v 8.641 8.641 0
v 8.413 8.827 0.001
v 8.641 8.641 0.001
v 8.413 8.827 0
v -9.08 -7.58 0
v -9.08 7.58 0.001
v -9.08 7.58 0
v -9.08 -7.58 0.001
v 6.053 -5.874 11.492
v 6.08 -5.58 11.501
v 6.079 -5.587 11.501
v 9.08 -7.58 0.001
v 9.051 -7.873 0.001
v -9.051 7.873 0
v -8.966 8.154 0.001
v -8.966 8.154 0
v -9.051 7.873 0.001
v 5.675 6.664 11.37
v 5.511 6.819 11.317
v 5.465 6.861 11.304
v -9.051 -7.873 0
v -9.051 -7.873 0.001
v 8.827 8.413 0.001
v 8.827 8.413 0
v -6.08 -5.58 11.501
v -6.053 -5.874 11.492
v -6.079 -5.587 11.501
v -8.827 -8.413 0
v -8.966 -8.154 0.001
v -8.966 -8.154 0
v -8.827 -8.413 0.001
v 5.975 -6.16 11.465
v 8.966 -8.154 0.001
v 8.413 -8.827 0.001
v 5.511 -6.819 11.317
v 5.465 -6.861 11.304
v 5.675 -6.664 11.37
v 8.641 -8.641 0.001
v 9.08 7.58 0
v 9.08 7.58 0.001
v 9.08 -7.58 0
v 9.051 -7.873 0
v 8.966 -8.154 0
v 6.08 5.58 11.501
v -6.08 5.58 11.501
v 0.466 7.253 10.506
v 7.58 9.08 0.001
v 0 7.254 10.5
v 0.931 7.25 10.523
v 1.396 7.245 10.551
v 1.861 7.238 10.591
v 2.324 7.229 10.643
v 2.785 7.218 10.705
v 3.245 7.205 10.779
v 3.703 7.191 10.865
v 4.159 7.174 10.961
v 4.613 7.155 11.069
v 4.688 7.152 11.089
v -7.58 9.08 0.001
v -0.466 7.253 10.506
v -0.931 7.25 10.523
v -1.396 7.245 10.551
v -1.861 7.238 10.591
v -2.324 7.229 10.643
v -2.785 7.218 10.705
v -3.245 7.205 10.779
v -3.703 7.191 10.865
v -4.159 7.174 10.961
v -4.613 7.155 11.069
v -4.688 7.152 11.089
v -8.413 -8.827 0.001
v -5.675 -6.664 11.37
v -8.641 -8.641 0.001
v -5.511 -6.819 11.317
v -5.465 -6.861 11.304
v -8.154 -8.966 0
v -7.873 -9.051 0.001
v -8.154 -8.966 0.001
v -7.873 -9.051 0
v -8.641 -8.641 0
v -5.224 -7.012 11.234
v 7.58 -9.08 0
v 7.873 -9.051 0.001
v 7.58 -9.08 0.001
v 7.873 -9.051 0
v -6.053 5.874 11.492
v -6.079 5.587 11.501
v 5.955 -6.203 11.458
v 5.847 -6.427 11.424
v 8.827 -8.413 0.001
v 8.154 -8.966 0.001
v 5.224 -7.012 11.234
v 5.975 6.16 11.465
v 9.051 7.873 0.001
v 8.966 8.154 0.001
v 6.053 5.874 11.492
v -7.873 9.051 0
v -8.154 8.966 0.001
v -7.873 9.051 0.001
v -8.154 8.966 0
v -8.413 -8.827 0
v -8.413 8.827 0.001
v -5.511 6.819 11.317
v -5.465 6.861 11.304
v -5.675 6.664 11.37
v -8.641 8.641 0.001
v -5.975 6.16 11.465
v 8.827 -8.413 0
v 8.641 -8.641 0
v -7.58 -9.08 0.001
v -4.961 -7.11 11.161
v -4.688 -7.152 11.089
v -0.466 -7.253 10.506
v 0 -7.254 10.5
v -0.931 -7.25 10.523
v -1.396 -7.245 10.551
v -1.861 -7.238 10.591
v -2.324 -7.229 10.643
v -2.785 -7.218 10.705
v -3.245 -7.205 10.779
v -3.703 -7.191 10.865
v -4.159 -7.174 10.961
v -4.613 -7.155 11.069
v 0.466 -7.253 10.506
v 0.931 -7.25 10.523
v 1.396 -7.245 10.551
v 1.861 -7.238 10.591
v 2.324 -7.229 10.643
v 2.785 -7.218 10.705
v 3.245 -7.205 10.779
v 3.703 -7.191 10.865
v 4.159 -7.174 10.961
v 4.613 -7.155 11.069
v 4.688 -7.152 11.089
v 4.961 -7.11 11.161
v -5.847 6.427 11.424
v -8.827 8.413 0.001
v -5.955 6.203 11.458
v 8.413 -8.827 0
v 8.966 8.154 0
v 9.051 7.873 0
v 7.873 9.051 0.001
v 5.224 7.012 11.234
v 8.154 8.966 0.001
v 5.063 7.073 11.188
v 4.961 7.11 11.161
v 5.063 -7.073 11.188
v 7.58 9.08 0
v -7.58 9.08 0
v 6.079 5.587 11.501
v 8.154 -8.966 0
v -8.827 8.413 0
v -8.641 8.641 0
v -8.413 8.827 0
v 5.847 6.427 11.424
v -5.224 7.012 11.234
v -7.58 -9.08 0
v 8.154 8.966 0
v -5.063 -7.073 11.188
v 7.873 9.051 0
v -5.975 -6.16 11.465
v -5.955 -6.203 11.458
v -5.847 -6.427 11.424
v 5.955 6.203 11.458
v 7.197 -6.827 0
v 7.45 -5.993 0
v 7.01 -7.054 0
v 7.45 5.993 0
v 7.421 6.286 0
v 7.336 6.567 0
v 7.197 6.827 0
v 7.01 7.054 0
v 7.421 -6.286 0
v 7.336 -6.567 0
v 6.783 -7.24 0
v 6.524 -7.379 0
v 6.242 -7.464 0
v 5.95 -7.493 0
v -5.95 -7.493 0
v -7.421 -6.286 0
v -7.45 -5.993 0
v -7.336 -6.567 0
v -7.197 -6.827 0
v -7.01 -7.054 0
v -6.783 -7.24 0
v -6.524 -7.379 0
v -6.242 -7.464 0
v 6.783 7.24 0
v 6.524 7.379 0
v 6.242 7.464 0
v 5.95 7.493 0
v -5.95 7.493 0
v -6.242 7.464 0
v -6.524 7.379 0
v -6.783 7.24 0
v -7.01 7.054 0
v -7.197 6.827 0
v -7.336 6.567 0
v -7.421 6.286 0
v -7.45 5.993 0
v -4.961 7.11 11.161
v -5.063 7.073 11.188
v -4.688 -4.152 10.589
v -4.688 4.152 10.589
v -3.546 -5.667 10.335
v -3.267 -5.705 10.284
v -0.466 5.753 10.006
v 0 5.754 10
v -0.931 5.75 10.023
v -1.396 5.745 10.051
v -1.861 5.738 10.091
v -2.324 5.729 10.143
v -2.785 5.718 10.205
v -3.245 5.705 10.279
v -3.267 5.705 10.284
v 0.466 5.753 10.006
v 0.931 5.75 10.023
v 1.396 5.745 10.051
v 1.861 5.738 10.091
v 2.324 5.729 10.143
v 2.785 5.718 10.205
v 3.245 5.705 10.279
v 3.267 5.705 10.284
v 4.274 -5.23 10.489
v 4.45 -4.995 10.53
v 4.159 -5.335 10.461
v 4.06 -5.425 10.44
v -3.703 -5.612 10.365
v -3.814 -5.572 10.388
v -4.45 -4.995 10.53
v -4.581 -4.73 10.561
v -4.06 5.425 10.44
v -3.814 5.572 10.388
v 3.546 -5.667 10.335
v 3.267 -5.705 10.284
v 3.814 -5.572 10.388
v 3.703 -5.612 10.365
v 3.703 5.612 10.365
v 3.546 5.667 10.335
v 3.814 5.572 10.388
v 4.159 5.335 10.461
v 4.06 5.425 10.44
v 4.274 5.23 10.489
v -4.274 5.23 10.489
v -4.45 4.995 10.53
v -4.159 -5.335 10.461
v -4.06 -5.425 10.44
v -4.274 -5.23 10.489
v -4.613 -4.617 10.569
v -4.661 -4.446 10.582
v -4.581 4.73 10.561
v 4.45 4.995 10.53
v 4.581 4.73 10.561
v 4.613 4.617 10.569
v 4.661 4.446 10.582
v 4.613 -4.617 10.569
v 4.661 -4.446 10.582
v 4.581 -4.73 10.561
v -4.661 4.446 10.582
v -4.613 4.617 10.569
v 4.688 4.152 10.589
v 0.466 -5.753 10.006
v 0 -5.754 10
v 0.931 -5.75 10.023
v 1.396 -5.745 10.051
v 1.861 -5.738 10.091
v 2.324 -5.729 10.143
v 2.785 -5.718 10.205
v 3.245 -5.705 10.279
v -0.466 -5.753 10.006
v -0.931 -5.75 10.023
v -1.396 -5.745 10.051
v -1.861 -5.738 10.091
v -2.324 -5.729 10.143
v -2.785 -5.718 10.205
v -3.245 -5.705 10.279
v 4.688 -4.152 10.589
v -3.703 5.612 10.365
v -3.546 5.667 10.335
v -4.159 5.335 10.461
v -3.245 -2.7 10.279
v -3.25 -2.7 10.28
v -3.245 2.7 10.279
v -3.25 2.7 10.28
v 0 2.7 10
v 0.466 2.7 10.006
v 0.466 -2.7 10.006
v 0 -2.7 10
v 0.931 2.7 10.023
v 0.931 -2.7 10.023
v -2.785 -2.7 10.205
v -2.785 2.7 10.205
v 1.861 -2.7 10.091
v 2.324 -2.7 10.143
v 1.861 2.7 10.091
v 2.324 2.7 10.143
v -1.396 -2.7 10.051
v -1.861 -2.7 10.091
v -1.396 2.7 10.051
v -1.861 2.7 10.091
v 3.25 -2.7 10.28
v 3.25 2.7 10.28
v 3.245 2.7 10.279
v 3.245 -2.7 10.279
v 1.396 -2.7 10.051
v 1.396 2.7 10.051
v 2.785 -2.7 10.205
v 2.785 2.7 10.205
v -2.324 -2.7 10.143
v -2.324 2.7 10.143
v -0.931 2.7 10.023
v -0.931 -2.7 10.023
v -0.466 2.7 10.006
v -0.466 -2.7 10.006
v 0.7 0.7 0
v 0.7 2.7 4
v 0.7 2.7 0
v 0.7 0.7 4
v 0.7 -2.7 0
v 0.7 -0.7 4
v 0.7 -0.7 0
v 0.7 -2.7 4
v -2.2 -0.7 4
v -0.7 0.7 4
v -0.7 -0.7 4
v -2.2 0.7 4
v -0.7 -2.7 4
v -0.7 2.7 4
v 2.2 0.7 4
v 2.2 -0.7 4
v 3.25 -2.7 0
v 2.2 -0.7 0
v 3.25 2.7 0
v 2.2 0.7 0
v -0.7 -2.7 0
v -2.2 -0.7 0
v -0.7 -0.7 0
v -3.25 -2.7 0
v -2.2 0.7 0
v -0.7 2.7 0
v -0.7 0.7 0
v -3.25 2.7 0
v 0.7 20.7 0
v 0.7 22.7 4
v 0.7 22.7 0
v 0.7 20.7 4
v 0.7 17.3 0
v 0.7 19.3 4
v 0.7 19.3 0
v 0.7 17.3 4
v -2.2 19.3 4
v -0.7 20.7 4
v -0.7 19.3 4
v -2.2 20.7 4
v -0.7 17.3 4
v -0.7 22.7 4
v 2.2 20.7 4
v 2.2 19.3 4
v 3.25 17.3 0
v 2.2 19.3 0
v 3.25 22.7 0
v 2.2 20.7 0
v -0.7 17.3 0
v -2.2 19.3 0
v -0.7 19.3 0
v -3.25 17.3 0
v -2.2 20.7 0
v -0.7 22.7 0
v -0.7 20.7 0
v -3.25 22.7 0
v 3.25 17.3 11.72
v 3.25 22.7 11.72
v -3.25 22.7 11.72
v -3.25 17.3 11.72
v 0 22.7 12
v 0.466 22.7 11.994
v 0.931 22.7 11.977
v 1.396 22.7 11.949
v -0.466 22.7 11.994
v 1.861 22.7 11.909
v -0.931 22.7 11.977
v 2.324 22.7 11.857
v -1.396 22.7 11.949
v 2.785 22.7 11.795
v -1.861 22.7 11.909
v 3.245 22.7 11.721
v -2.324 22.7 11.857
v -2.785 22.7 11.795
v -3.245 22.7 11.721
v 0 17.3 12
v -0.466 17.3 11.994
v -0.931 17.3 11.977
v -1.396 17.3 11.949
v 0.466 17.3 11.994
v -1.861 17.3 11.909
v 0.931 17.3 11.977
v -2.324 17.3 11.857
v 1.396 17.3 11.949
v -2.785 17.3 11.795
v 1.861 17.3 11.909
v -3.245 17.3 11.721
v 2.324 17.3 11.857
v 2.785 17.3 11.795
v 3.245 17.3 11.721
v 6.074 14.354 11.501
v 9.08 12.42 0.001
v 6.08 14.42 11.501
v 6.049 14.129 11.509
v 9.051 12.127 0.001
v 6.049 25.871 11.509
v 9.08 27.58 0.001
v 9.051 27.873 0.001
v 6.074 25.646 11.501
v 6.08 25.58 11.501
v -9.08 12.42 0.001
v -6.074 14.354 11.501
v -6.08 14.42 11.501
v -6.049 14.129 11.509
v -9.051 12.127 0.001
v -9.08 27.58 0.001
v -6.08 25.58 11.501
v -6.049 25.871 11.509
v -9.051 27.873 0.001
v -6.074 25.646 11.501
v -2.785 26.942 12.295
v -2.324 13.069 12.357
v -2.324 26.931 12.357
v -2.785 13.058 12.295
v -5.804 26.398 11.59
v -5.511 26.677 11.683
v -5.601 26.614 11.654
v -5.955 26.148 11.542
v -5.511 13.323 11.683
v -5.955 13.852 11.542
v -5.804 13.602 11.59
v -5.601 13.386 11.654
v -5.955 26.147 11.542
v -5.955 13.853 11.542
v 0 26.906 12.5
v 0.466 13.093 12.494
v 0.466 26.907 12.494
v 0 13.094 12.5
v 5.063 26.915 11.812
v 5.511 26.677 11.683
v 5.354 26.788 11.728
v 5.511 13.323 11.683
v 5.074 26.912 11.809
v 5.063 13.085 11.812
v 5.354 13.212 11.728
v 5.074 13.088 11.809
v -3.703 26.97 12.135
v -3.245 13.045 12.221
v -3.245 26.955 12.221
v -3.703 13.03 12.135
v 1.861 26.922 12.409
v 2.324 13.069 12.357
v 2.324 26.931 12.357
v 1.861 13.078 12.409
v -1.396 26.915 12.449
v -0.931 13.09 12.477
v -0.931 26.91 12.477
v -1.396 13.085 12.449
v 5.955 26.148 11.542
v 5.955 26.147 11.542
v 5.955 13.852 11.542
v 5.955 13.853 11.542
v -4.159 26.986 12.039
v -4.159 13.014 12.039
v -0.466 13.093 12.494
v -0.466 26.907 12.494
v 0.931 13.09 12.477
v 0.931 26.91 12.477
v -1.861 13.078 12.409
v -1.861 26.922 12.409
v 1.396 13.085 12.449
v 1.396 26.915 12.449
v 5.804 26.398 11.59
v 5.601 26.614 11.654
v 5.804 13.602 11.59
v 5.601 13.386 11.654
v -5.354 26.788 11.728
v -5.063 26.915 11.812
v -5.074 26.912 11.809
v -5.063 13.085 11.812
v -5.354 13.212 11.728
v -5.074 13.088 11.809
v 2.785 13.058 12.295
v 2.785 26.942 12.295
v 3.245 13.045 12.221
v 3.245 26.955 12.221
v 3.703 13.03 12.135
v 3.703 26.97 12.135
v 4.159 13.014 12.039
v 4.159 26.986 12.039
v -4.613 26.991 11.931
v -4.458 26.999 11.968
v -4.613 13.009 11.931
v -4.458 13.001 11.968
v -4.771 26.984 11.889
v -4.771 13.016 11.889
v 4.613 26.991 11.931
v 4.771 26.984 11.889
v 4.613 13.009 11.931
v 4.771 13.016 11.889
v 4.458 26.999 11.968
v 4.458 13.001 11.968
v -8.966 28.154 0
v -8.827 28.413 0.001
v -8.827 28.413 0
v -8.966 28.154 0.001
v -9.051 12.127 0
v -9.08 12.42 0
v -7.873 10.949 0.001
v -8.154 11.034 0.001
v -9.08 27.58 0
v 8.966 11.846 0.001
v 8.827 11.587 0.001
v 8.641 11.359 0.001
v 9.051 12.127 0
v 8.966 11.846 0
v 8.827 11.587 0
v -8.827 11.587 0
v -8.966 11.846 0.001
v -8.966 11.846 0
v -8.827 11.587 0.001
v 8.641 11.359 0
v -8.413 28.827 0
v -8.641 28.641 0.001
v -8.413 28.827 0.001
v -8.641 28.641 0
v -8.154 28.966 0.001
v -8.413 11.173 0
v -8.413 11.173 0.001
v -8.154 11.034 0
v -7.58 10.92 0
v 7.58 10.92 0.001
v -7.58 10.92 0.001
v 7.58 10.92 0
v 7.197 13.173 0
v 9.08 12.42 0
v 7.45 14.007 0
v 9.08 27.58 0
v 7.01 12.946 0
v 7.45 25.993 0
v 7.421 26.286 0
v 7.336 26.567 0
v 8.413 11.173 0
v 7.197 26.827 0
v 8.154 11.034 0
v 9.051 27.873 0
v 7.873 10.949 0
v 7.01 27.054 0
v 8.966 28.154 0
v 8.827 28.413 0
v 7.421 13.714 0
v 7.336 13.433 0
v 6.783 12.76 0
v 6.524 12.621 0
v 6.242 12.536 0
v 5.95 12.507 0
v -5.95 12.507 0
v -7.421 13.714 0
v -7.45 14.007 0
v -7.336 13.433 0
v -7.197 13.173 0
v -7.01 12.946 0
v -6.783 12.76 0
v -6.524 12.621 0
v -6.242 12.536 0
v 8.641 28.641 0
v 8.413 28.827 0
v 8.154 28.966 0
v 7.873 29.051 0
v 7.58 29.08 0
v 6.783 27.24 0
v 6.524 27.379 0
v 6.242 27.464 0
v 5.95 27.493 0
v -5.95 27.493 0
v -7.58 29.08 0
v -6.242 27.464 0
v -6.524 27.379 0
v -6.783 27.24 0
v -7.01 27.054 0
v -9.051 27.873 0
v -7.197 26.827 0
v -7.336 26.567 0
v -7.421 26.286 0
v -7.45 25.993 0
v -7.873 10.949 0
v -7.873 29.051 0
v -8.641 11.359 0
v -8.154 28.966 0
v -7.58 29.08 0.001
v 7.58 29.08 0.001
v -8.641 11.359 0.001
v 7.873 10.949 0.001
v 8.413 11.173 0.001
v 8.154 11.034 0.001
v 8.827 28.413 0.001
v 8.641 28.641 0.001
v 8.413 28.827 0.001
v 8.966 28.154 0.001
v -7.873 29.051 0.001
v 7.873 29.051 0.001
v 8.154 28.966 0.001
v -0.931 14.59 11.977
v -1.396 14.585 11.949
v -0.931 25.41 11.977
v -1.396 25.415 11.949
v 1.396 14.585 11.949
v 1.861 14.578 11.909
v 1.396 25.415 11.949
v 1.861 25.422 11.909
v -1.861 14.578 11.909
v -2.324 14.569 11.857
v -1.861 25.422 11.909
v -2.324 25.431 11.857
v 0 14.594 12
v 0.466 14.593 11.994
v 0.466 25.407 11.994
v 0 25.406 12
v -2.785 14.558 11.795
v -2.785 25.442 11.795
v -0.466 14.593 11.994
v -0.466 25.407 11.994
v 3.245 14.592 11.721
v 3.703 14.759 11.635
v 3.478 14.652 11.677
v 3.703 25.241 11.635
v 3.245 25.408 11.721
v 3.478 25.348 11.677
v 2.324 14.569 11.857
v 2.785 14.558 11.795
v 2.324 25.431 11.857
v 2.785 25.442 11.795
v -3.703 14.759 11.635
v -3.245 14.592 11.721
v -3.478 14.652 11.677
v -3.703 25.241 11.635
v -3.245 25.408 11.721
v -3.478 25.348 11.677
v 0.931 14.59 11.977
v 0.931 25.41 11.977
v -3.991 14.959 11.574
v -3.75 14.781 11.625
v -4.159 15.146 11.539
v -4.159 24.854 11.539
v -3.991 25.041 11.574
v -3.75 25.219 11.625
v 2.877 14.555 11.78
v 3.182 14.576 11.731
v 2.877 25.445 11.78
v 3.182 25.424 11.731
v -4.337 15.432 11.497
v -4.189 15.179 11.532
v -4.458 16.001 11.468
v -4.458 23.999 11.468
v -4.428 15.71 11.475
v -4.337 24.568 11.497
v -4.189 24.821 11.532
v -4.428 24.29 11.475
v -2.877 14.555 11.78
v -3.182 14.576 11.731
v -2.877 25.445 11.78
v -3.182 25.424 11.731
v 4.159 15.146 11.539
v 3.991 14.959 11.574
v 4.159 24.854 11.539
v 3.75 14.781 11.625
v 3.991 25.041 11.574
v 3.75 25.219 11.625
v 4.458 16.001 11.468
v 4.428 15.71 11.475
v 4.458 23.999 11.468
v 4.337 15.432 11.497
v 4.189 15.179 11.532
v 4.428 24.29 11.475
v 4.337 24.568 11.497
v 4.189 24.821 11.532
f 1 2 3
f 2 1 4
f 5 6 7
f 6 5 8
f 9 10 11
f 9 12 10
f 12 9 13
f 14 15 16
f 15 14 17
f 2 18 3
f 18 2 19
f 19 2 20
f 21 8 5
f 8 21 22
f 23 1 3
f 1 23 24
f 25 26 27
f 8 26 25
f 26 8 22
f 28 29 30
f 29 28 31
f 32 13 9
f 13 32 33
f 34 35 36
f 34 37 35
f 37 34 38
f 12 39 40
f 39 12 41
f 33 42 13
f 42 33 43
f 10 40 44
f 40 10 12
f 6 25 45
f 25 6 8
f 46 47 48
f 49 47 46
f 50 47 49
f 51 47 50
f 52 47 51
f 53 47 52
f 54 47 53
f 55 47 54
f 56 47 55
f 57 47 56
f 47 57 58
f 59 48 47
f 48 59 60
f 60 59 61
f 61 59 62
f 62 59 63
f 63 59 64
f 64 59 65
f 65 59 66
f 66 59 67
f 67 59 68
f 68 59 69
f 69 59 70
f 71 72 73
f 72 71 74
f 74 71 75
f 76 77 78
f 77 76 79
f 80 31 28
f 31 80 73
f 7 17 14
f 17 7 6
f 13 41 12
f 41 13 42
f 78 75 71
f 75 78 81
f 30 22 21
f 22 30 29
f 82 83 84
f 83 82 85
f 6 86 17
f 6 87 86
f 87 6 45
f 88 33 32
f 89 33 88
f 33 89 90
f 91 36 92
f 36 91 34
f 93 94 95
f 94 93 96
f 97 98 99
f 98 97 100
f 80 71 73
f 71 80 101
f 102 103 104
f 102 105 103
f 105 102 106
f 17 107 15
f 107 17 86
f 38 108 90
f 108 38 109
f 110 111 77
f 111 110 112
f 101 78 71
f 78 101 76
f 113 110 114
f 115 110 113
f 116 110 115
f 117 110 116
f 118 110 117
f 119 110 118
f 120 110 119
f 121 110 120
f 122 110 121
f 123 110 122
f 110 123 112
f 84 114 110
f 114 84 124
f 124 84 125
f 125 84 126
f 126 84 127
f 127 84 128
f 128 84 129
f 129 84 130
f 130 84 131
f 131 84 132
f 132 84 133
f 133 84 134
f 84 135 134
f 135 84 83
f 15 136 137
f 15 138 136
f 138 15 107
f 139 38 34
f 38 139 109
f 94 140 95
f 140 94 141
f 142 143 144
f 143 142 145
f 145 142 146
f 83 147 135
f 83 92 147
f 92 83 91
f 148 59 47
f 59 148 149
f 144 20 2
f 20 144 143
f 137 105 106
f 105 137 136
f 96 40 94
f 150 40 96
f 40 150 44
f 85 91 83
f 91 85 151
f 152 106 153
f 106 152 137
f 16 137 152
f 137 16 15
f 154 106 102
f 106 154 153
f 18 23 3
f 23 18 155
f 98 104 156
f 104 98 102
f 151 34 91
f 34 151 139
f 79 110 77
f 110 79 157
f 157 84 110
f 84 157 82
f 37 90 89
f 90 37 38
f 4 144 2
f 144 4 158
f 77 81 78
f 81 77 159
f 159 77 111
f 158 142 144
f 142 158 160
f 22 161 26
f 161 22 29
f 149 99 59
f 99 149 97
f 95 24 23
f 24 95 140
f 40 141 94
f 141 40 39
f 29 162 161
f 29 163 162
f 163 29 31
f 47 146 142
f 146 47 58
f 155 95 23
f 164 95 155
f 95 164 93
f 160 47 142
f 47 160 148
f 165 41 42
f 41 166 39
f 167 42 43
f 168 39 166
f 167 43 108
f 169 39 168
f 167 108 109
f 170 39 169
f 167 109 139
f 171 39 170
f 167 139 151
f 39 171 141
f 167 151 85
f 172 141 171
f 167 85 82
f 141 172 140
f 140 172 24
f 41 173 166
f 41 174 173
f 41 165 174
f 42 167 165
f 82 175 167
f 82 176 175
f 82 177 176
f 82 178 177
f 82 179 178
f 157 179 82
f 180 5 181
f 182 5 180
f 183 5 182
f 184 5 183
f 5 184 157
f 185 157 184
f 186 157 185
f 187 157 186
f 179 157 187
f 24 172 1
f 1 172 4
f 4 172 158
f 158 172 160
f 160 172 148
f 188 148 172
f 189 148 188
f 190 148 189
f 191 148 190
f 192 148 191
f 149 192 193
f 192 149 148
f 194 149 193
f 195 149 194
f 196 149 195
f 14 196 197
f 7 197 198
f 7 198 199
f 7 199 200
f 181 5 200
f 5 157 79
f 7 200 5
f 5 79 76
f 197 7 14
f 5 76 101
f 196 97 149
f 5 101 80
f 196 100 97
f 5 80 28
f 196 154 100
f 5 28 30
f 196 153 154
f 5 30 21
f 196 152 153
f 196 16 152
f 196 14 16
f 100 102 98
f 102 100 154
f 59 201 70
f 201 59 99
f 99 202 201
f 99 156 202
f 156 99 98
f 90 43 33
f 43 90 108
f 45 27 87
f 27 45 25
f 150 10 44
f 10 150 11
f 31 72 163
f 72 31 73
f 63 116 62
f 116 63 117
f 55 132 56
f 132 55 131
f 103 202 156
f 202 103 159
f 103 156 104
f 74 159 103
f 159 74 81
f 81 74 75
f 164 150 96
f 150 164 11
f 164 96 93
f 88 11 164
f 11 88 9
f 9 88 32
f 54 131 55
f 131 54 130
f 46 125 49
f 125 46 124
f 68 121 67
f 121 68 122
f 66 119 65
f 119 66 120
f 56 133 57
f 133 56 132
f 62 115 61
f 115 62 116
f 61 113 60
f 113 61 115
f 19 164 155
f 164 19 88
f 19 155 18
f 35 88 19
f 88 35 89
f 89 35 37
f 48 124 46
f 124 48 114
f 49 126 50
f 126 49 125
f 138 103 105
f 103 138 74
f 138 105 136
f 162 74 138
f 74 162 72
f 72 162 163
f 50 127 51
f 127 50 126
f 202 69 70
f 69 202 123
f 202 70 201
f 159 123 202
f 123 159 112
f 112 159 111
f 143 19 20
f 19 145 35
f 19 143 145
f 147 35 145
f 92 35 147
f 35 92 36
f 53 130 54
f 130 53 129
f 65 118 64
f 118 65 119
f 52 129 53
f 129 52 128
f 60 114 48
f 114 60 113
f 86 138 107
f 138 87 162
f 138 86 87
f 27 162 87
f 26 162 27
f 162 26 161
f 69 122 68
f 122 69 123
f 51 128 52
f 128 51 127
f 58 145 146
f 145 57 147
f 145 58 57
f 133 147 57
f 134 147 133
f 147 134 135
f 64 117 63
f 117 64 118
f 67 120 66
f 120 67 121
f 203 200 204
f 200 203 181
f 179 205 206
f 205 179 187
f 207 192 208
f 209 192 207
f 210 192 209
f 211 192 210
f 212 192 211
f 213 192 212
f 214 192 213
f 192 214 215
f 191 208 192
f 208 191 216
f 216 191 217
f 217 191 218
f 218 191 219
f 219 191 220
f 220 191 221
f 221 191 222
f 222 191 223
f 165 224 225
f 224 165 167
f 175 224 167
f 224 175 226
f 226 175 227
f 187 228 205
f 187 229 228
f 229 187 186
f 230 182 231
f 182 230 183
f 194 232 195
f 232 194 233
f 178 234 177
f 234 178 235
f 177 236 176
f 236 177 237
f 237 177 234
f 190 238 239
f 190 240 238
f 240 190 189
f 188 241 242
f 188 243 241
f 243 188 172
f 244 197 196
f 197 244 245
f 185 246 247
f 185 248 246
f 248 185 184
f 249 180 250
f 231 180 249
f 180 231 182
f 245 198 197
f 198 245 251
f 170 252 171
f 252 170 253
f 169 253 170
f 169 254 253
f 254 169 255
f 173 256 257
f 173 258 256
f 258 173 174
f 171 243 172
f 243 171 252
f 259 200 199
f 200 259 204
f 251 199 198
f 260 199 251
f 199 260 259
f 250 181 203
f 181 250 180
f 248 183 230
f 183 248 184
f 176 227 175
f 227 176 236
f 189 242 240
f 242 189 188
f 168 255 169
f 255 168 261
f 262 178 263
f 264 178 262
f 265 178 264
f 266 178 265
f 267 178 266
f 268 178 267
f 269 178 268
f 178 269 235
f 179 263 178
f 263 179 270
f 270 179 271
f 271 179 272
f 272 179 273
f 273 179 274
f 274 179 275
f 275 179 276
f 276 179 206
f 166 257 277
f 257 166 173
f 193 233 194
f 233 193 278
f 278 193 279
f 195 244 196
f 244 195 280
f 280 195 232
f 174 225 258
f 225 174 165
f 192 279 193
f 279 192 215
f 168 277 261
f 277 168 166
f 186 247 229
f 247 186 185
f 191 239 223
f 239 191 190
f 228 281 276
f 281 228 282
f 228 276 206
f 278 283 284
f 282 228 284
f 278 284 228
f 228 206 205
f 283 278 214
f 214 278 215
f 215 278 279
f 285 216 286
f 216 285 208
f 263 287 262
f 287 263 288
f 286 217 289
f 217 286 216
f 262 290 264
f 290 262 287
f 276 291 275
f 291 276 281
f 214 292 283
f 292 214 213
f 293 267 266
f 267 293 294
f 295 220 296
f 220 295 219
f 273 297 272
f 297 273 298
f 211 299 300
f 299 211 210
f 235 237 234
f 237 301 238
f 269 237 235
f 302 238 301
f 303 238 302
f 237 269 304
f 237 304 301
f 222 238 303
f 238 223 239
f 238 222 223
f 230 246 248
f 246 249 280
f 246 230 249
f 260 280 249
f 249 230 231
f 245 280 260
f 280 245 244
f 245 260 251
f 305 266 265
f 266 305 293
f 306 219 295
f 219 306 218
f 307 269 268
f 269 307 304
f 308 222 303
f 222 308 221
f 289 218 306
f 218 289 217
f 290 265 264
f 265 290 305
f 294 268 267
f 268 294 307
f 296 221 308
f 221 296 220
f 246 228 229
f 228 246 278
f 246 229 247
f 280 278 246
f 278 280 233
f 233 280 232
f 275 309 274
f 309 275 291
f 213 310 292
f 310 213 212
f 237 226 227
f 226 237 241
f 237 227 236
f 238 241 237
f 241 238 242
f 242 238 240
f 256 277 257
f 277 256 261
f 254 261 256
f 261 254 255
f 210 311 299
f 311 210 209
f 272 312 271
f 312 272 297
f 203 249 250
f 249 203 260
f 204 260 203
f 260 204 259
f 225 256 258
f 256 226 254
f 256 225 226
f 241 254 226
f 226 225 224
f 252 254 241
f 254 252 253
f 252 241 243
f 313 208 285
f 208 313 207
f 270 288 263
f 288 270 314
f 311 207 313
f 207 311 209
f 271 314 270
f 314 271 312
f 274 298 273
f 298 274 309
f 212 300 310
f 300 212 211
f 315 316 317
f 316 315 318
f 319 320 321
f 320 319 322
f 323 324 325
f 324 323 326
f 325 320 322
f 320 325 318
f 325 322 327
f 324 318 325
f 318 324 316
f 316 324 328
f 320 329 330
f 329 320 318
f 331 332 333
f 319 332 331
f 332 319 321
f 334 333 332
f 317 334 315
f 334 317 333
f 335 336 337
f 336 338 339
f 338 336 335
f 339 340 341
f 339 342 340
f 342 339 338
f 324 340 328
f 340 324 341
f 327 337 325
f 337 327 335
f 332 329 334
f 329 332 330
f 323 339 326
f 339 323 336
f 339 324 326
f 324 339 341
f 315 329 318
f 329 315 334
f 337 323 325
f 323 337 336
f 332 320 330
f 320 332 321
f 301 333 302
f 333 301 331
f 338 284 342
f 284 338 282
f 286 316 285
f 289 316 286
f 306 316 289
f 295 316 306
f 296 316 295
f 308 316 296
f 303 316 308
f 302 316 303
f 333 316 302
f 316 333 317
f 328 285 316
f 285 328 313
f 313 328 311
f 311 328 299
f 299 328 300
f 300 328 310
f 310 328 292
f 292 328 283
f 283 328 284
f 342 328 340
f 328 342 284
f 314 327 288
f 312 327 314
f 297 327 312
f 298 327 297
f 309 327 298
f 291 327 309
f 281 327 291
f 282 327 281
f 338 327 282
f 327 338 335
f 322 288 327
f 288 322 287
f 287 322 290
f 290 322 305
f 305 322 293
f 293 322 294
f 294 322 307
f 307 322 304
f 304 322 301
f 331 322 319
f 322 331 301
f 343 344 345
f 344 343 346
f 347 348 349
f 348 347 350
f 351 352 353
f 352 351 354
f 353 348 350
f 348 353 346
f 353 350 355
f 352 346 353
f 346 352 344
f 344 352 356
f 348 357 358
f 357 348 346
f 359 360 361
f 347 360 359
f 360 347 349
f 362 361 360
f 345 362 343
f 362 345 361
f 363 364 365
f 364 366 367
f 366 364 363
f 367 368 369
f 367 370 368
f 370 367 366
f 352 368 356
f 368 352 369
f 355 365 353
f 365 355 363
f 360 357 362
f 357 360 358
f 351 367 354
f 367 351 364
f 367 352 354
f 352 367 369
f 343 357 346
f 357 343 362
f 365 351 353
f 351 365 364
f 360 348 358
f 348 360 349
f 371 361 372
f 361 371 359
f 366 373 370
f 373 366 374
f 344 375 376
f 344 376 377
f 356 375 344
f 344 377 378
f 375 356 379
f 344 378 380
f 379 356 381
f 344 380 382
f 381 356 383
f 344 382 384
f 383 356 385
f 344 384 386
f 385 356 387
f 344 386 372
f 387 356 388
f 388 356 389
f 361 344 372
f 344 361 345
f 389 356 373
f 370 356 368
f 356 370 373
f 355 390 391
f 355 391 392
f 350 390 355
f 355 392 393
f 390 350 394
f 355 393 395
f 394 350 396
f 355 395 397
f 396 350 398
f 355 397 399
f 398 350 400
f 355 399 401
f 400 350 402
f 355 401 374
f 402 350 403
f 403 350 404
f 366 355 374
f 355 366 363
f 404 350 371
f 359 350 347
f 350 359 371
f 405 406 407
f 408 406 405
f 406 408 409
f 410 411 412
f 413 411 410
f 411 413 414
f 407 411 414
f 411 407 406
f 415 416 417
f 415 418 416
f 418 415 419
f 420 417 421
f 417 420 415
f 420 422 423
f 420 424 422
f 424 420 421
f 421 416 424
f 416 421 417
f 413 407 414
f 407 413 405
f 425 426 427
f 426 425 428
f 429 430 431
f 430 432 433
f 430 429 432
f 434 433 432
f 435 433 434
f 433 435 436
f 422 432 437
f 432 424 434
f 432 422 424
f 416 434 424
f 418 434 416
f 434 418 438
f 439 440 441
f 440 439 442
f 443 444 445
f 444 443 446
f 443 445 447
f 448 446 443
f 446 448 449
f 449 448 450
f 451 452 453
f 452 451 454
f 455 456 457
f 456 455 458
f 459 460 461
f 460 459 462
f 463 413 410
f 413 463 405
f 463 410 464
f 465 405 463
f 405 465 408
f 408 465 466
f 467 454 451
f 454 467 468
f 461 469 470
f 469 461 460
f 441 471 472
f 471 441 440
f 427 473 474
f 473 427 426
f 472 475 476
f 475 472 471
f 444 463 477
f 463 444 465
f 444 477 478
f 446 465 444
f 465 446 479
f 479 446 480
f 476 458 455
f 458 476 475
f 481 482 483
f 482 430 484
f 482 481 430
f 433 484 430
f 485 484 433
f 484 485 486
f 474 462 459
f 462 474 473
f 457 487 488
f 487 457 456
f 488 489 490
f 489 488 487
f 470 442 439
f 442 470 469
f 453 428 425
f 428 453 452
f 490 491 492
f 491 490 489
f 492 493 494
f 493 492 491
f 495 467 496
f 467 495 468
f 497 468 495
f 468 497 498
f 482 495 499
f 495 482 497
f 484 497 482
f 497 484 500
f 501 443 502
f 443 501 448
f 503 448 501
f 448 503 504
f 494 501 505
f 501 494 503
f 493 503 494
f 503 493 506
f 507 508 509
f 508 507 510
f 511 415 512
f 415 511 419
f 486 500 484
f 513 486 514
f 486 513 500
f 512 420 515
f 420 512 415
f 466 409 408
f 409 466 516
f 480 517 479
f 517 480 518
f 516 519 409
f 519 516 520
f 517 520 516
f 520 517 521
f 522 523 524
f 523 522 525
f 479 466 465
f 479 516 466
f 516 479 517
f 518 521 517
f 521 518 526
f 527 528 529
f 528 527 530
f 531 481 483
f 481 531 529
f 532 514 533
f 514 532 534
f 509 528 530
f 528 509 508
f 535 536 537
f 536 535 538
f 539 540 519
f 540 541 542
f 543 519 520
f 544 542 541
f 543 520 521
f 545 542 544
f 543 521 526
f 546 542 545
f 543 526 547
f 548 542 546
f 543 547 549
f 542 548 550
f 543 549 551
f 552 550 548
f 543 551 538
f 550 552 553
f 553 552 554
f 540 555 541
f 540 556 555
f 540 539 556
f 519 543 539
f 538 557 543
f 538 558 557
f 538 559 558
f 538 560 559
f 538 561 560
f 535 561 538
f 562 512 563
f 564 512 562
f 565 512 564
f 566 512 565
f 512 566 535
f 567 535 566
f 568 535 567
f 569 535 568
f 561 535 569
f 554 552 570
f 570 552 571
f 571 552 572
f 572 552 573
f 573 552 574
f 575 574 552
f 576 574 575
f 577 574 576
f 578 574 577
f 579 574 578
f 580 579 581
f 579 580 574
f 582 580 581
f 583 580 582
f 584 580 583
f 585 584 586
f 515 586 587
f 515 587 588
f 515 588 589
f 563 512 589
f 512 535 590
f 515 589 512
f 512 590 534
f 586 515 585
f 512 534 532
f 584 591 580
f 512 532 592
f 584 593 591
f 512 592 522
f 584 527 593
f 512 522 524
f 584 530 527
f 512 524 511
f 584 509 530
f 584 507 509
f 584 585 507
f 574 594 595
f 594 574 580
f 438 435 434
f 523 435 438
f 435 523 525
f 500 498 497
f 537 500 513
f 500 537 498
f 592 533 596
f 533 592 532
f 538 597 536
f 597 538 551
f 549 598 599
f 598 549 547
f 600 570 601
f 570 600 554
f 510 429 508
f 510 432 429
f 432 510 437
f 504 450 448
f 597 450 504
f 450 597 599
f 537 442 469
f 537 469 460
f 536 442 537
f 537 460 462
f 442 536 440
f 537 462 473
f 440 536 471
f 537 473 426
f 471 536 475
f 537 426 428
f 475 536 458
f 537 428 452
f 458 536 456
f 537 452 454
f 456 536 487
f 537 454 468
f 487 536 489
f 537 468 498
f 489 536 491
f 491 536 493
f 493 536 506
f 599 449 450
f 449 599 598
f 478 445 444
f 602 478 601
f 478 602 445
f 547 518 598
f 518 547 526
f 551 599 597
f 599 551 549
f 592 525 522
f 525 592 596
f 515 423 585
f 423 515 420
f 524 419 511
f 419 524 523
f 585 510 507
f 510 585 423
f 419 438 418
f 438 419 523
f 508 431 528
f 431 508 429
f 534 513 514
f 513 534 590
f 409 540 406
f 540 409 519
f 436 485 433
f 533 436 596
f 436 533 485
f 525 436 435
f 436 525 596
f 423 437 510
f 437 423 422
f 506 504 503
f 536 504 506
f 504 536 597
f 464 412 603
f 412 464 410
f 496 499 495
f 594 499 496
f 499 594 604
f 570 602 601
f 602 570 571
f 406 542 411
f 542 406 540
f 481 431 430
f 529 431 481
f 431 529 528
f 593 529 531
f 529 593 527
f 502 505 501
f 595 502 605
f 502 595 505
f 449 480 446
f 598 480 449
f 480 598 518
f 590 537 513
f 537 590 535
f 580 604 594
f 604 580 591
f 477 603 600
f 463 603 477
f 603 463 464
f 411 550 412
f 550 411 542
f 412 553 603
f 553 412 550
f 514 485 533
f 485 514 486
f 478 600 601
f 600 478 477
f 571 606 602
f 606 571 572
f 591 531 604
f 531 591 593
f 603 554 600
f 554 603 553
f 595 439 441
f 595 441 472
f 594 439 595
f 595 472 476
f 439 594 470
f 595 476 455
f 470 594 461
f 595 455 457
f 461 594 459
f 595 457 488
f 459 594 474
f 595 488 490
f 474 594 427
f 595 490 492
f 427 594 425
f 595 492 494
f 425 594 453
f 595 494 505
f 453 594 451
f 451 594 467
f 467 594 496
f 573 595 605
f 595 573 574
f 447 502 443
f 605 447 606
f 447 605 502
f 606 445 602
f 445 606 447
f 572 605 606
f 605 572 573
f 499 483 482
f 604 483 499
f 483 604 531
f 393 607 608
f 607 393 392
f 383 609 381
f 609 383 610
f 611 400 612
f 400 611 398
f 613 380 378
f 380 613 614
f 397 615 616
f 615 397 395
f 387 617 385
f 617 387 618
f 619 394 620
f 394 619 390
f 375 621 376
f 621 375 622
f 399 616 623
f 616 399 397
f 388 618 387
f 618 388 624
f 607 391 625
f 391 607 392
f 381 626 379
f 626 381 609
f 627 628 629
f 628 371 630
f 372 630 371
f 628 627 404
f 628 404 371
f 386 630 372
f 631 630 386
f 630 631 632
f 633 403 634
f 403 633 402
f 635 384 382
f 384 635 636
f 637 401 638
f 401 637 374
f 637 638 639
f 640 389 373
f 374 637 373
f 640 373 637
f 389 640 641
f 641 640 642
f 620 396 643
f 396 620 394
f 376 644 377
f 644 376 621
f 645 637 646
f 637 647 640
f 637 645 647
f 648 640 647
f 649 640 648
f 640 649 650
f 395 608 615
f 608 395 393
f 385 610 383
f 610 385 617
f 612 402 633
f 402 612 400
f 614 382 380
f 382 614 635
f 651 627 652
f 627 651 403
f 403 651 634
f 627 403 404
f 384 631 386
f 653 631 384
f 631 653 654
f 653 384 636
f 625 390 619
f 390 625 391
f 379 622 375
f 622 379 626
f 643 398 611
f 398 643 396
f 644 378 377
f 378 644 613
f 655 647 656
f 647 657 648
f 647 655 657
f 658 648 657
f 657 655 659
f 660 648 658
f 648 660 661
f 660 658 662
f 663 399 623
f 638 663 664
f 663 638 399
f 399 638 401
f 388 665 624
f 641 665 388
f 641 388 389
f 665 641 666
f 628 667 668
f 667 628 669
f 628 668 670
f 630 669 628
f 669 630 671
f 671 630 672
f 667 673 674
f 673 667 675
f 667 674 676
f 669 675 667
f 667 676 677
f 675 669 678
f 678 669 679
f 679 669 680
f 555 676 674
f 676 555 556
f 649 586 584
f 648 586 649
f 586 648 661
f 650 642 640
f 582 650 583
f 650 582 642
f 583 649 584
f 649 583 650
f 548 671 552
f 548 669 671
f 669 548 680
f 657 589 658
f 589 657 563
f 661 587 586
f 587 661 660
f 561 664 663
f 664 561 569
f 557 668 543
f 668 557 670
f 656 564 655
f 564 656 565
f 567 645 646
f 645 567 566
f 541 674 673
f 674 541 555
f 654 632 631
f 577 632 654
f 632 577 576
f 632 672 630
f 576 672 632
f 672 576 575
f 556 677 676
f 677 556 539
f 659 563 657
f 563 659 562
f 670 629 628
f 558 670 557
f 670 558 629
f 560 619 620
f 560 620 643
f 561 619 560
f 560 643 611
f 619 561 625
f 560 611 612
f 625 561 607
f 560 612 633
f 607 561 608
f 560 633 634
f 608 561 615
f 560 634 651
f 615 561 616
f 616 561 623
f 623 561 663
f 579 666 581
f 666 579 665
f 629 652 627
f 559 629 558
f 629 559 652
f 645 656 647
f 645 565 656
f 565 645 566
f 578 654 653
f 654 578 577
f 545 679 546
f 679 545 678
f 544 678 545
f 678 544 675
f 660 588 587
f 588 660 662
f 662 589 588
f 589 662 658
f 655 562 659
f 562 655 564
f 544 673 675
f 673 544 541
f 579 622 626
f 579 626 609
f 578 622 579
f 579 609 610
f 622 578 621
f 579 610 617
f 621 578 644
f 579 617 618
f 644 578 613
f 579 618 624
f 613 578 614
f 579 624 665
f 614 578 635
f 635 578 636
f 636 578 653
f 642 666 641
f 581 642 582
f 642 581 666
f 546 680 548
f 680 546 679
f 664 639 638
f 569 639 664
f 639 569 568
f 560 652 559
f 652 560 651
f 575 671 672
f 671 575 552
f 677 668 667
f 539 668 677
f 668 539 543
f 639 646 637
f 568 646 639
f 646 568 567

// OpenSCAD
union() {
	union() {
		difference() {
			difference() {
				hull() {
					translate(v = [-9.0800000000, -9.0800000000, 0]) {
						linear_extrude(height = 0.0010000000) {
							hull() {
								translate(v = [1.5000000000, 1.5000000000, 0]) {
									circle($fn = 32, r = 1.5000000000);
								}
								translate(v = [16.6600000000, 1.5000000000, 0]) {
									circle($fn = 32, r = 1.5000000000);
								}
								translate(v = [16.6600000000, 16.6600000000, 0]) {
									circle($fn = 32, r = 1.5000000000);
								}
								translate(v = [1.5000000000, 16.6600000000, 0]) {
									circle($fn = 32, r = 1.5000000000);
								}
							}
						}
					}
					translate(v = [0, 0, 11.5000000000]) {
						rotate(a = [0, 0, 0]) {
							translate(v = [-6.0800000000, -7.0800000000, 0]) {
								linear_extrude(height = 0.0010000000) {
									hull() {
										translate(v = [1.5000000000, 1.5000000000, 0]) {
											circle($fn = 32, r = 1.5000000000);
										}
										translate(v = [10.6600000000, 1.5000000000, 0]) {
											circle($fn = 32, r = 1.5000000000);
										}
										translate(v = [10.6600000000, 12.6600000000, 0]) {
											circle($fn = 32, r = 1.5000000000);
										}
										translate(v = [1.5000000000, 12.6600000000, 0]) {
											circle($fn = 32, r = 1.5000000000);
										}
									}
								}
							}
						}
					}
				}
				translate(v = [0, 0, 11.5000000000]) {
					rotate(a = [90, 0, 0]) {
						translate(v = [0, 17.9832000000, 0]) {
							cylinder($fn = 256, center = true, h = 100, r = 18.9832000000);
						}
					}
				}
			}
			translate(v = [0, 0, -0.5000000000]) {
				difference() {
					hull() {
						translate(v = [-7.5800000000, -7.5800000000, 0]) {
							linear_extrude(height = 0.0010000000) {
								hull() {
									translate(v = [1.5000000000, 1.5000000000, 0]) {
										circle($fn = 32, r = 1.5000000000);
									}
									translate(v = [13.6600000000, 1.5000000000, 0]) {
										circle($fn = 32, r = 1.5000000000);
									}
									translate(v = [13.6600000000, 13.6600000000, 0]) {
										circle($fn = 32, r = 1.5000000000);
									}
									translate(v = [1.5000000000, 13.6600000000, 0]) {
										circle($fn = 32, r = 1.5000000000);
									}
								}
							}
						}
						translate(v = [0, 0, 11.5000000000]) {
							rotate(a = [0, 0, 0]) {
								translate(v = [-4.5800000000, -5.5800000000, 0]) {
									linear_extrude(height = 0.0010000000) {
										hull() {
											translate(v = [1.5000000000, 1.5000000000, 0]) {
												circle($fn = 32, r = 1.5000000000);
											}
											translate(v = [7.6600000000, 1.5000000000, 0]) {
												circle($fn = 32, r = 1.5000000000);
											}
											translate(v = [7.6600000000, 9.6600000000, 0]) {
												circle($fn = 32, r = 1.5000000000);
											}
											translate(v = [1.5000000000, 9.6600000000, 0]) {
												circle($fn = 32, r = 1.5000000000);
											}
										}
									}
								}
							}
						}
					}
					translate(v = [0, 0, 11.5000000000]) {
						rotate(a = [90, 0, 0]) {
							translate(v = [0, 17.9832000000, 0]) {
								cylinder($fn = 256, center = true, h = 100, r = 18.9832000000);
							}
						}
					}
				}
			}
		}
		difference() {
			rotate(a = [0, 0, 0]) {
				difference() {
					translate(v = [-3.2500000000, -2.7000000000, 0]) {
						cube(size = [6.5000000000, 5.4000000000, 50]);
					}
					translate(v = [0, 0, 2.0000000000]) {
						union() {
							cube(center = true, size = [1.4000000000, 5.5000000000, 4]);
							cube(center = true, size = [4.4000000000, 1.4000000000, 4]);
						}
					}
				}
			}
			difference() {
				translate(v = [0, 0, 50]) {
					cube(center = true, size = [100, 100, 100]);
				}
				difference() {
					hull() {
						translate(v = [-7.5800000000, -7.5800000000, 0]) {
							linear_extrude(height = 0.0010000000) {
								hull() {
									translate(v = [1.5000000000, 1.5000000000, 0]) {
										circle($fn = 32, r = 1.5000000000);
									}
									translate(v = [13.6600000000, 1.5000000000, 0]) {
										circle($fn = 32, r = 1.5000000000);
									}
									translate(v = [13.6600000000, 13.6600000000, 0]) {
										circle($fn = 32, r = 1.5000000000);
									}
									translate(v = [1.5000000000, 13.6600000000, 0]) {
										circle($fn = 32, r = 1.5000000000);
									}
								}
							}
						}
						translate(v = [0, 0, 11.5000000000]) {
							rotate(a = [0, 0, 0]) {
								translate(v = [-4.5800000000, -5.5800000000, 0]) {
									linear_extrude(height = 0.0010000000) {
										hull() {
											translate(v = [1.5000000000, 1.5000000000, 0]) {
												circle($fn = 32, r = 1.5000000000);
											}
											translate(v = [7.6600000000, 1.5000000000, 0]) {
												circle($fn = 32, r = 1.5000000000);
											}
											translate(v = [7.6600000000, 9.6600000000, 0]) {
												circle($fn = 32, r = 1.5000000000);
											}
											translate(v = [1.5000000000, 9.6600000000, 0]) {
												circle($fn = 32, r = 1.5000000000);
											}
										}
									}
								}
							}
						}
					}
					translate(v = [0, 0, 11.5000000000]) {
						rotate(a = [90, 0, 0]) {
							translate(v = [0, 17.9832000000, 0]) {
								cylinder($fn = 256, center = true, h = 100, r = 18.9832000000);
							}
						}
					}
				}
			}
		}
	}
	translate(v = [0, 20, 0]) {
		union() {
			difference() {
				difference() {
					union() {
						hull() {
							translate(v = [-9.0800000000, -9.0800000000, 0]) {
								linear_extrude(height = 0.0010000000) {
									hull() {
										translate(v = [1.5000000000, 1.5000000000, 0]) {
											circle($fn = 32, r = 1.5000000000);
										}
										translate(v = [16.6600000000, 1.5000000000, 0]) {
											circle($fn = 32, r = 1.5000000000);
										}
										translate(v = [16.6600000000, 16.6600000000, 0]) {
											circle($fn = 32, r = 1.5000000000);
										}
										translate(v = [1.5000000000, 16.6600000000, 0]) {
											circle($fn = 32, r = 1.5000000000);
										}
									}
								}
							}
							translate(v = [0, 0, 11.5000000000]) {
								rotate(a = [0, 0, 0]) {
									translate(v = [-6.0800000000, -7.0800000000, 0]) {
										linear_extrude(height = 0.0010000000) {
											hull() {
												translate(v = [1.5000000000, 1.5000000000, 0]) {
													circle($fn = 32, r = 1.5000000000);
												}
												translate(v = [10.6600000000, 1.5000000000, 0]) {
													circle($fn = 32, r = 1.5000000000);
												}
												translate(v = [10.6600000000, 12.6600000000, 0]) {
													circle($fn = 32, r = 1.5000000000);
												}
												translate(v = [1.5000000000, 12.6600000000, 0]) {
													circle($fn = 32, r = 1.5000000000);
												}
											}
										}
									}
								}
							}
						}
						translate(v = [0, 0, 11.5000000000]) {
							rotate(a = [90, 0, 0]) {
								translate(v = [0, -17.9832000000, 0]) {
									cylinder($fn = 256, center = true, h = 100, r = 18.9832000000);
								}
							}
						}
					}
					difference() {
						cube(center = true, size = [1000, 1000, 1000]);
						hull() {
							translate(v = [-9.0800000000, -9.0800000000, 0]) {
								linear_extrude(height = 0.0010000000) {
									hull() {
										translate(v = [1.5000000000, 1.5000000000, 0]) {
											circle($fn = 32, r = 1.5000000000);
										}
										translate(v = [16.6600000000, 1.5000000000, 0]) {
											circle($fn = 32, r = 1.5000000000);
										}
										translate(v = [16.6600000000, 16.6600000000, 0]) {
											circle($fn = 32, r = 1.5000000000);
										}
										translate(v = [1.5000000000, 16.6600000000, 0]) {
											circle($fn = 32, r = 1.5000000000);
										}
									}
								}
							}
							translate(v = [0, 0, 23.0000000000]) {
								rotate(a = [0, 0, 0]) {
									translate(v = [-3.0800000000, -5.0800000000, 0]) {
										linear_extrude(height = 0.0010000000) {
											hull() {
												translate(v = [1.5000000000, 1.5000000000, 0]) {
													circle($fn = 32, r = 1.5000000000);
												}
												translate(v = [4.6600000000, 1.5000000000, 0]) {
													circle($fn = 32, r = 1.5000000000);
												}
												translate(v = [4.6600000000, 8.6600000000, 0]) {
													circle($fn = 32, r = 1.5000000000);
												}
												translate(v = [1.5000000000, 8.6600000000, 0]) {
													circle($fn = 32, r = 1.5000000000);
												}
											}
										}
									}
								}
							}
						}
					}
				}
				translate(v = [0, 0, -0.5000000000]) {
					difference() {
						union() {
							hull() {
								translate(v = [-7.5800000000, -7.5800000000, 0]) {
									linear_extrude(height = 0.0010000000) {
										hull() {
											translate(v = [1.5000000000, 1.5000000000, 0]) {
												circle($fn = 32, r = 1.5000000000);
											}
											translate(v = [13.6600000000, 1.5000000000, 0]) {
												circle($fn = 32, r = 1.5000000000);
											}
											translate(v = [13.6600000000, 13.6600000000, 0]) {
												circle($fn = 32, r = 1.5000000000);
											}
											translate(v = [1.5000000000, 13.6600000000, 0]) {
												circle($fn = 32, r = 1.5000000000);
											}
										}
									}
								}
								translate(v = [0, 0, 11.5000000000]) {
									rotate(a = [0, 0, 0]) {
										translate(v = [-4.5800000000, -5.5800000000, 0]) {
											linear_extrude(height = 0.0010000000) {
												hull() {
													translate(v = [1.5000000000, 1.5000000000, 0]) {
														circle($fn = 32, r = 1.5000000000);
													}
													translate(v = [7.6600000000, 1.5000000000, 0]) {
														circle($fn = 32, r = 1.5000000000);
													}
													translate(v = [7.6600000000, 9.6600000000, 0]) {
														circle($fn = 32, r = 1.5000000000);
													}
													translate(v = [1.5000000000, 9.6600000000, 0]) {
														circle($fn = 32, r = 1.5000000000);
													}
												}
											}
										}
									}
								}
							}
							translate(v = [0, 0, 11.5000000000]) {
								rotate(a = [90, 0, 0]) {
									translate(v = [0, -17.9832000000, 0]) {
										cylinder($fn = 256, center = true, h = 100, r = 18.9832000000);
									}
								}
							}
						}
						difference() {
							cube(center = true, size = [1000, 1000, 1000]);
							hull() {
								translate(v = [-7.5800000000, -7.5800000000, 0]) {
									linear_extrude(height = 0.0010000000) {
										hull() {
											translate(v = [1.5000000000, 1.5000000000, 0]) {
												circle($fn = 32, r = 1.5000000000);
											}
											translate(v = [13.6600000000, 1.5000000000, 0]) {
												circle($fn = 32, r = 1.5000000000);
											}
											translate(v = [13.6600000000, 13.6600000000, 0]) {
												circle($fn = 32, r = 1.5000000000);
											}
											translate(v = [1.5000000000, 13.6600000000, 0]) {
												circle($fn = 32, r = 1.5000000000);
											}
										}
									}
								}
								translate(v = [0, 0, 23.0000000000]) {
									rotate(a = [0, 0, 0]) {
										translate(v = [-1.5800000000, -3.5800000000, 0]) {
											linear_extrude(height = 0.0010000000) {
												hull() {
													translate(v = [1.5000000000, 1.5000000000, 0]) {
														circle($fn = 32, r = 1.5000000000);
													}
													translate(v = [1.6600000000, 1.5000000000, 0]) {
														circle($fn = 32, r = 1.5000000000);
													}
													translate(v = [1.6600000000, 5.6600000000, 0]) {
														circle($fn = 32, r = 1.5000000000);
													}
													translate(v = [1.5000000000, 5.6600000000, 0]) {
														circle($fn = 32, r = 1.5000000000);
													}
												}
											}
										}
									}
								}
							}
						}
					}
				}
			}
			difference() {
				rotate(a = [0, 0, 0]) {
					difference() {
						translate(v = [-3.2500000000, -2.7000000000, 0]) {
							cube(size = [6.5000000000, 5.4000000000, 50]);
						}
						translate(v = [0, 0, 2.0000000000]) {
							union() {
								cube(center = true, size = [1.4000000000, 5.5000000000, 4]);
								cube(center = true, size = [4.4000000000, 1.4000000000, 4]);
							}
						}
					}
				}
				difference() {
					translate(v = [0, 0, 50]) {
						cube(center = true, size = [100, 100, 100]);
					}
					difference() {
						union() {
							hull() {
								translate(v = [-7.5800000000, -7.5800000000, 0]) {
									linear_extrude(height = 0.0010000000) {
										hull() {
											translate(v = [1.5000000000, 1.5000000000, 0]) {
												circle($fn = 32, r = 1.5000000000);
											}
											translate(v = [13.6600000000, 1.5000000000, 0]) {
												circle($fn = 32, r = 1.5000000000);
											}
											translate(v = [13.6600000000, 13.6600000000, 0]) {
												circle($fn = 32, r = 1.5000000000);
											}
											translate(v = [1.5000000000, 13.6600000000, 0]) {
												circle($fn = 32, r = 1.5000000000);
											}
										}
									}
								}
								translate(v = [0, 0, 11.5000000000]) {
									rotate(a = [0, 0, 0]) {
										translate(v = [-4.5800000000, -5.5800000000, 0]) {
											linear_extrude(height = 0.0010000000) {
												hull() {
													translate(v = [1.5000000000, 1.5000000000, 0]) {
														circle($fn = 32, r = 1.5000000000);
													}
													translate(v = [7.6600000000, 1.5000000000, 0]) {
														circle($fn = 32, r = 1.5000000000);
													}
													translate(v = [7.6600000000, 9.6600000000, 0]) {
														circle($fn = 32, r = 1.5000000000);
													}
													translate(v = [1.5000000000, 9.6600000000, 0]) {
														circle($fn = 32, r = 1.5000000000);
													}
												}
											}
										}
									}
								}
							}
							translate(v = [0, 0, 11.5000000000]) {
								rotate(a = [90, 0, 0]) {
									translate(v = [0, -17.9832000000, 0]) {
										cylinder($fn = 256, center = true, h = 100, r = 18.9832000000);
									}
								}
							}
						}
						difference() {
							cube(center = true, size = [1000, 1000, 1000]);
							hull() {
								translate(v = [-7.5800000000, -7.5800000000, 0]) {
									linear_extrude(height = 0.0010000000) {
										hull() {
											translate(v = [1.5000000000, 1.5000000000, 0]) {
												circle($fn = 32, r = 1.5000000000);
											}
											translate(v = [13.6600000000, 1.5000000000, 0]) {
												circle($fn = 32, r = 1.5000000000);
											}
											translate(v = [13.6600000000, 13.6600000000, 0]) {
												circle($fn = 32, r = 1.5000000000);
											}
											translate(v = [1.5000000000, 13.6600000000, 0]) {
												circle($fn = 32, r = 1.5000000000);
											}
										}
									}
								}
								translate(v = [0, 0, 23.0000000000]) {
									rotate(a = [0, 0, 0]) {
										translate(v = [-1.5800000000, -3.5800000000, 0]) {
											linear_extrude(height = 0.0010000000) {
												hull() {
													translate(v = [1.5000000000, 1.5000000000, 0]) {
														circle($fn = 32, r = 1.5000000000);
													}
													translate(v = [1.6600000000, 1.5000000000, 0]) {
														circle($fn = 32, r = 1.5000000000);
													}
													translate(v = [1.6600000000, 5.6600000000, 0]) {
														circle($fn = 32, r = 1.5000000000);
													}
													translate(v = [1.5000000000, 5.6600000000, 0]) {
														circle($fn = 32, r = 1.5000000000);
													}
												}
											}
										}
									}
								}
							}
						}
					}
				}
			}
		}
	}
}
